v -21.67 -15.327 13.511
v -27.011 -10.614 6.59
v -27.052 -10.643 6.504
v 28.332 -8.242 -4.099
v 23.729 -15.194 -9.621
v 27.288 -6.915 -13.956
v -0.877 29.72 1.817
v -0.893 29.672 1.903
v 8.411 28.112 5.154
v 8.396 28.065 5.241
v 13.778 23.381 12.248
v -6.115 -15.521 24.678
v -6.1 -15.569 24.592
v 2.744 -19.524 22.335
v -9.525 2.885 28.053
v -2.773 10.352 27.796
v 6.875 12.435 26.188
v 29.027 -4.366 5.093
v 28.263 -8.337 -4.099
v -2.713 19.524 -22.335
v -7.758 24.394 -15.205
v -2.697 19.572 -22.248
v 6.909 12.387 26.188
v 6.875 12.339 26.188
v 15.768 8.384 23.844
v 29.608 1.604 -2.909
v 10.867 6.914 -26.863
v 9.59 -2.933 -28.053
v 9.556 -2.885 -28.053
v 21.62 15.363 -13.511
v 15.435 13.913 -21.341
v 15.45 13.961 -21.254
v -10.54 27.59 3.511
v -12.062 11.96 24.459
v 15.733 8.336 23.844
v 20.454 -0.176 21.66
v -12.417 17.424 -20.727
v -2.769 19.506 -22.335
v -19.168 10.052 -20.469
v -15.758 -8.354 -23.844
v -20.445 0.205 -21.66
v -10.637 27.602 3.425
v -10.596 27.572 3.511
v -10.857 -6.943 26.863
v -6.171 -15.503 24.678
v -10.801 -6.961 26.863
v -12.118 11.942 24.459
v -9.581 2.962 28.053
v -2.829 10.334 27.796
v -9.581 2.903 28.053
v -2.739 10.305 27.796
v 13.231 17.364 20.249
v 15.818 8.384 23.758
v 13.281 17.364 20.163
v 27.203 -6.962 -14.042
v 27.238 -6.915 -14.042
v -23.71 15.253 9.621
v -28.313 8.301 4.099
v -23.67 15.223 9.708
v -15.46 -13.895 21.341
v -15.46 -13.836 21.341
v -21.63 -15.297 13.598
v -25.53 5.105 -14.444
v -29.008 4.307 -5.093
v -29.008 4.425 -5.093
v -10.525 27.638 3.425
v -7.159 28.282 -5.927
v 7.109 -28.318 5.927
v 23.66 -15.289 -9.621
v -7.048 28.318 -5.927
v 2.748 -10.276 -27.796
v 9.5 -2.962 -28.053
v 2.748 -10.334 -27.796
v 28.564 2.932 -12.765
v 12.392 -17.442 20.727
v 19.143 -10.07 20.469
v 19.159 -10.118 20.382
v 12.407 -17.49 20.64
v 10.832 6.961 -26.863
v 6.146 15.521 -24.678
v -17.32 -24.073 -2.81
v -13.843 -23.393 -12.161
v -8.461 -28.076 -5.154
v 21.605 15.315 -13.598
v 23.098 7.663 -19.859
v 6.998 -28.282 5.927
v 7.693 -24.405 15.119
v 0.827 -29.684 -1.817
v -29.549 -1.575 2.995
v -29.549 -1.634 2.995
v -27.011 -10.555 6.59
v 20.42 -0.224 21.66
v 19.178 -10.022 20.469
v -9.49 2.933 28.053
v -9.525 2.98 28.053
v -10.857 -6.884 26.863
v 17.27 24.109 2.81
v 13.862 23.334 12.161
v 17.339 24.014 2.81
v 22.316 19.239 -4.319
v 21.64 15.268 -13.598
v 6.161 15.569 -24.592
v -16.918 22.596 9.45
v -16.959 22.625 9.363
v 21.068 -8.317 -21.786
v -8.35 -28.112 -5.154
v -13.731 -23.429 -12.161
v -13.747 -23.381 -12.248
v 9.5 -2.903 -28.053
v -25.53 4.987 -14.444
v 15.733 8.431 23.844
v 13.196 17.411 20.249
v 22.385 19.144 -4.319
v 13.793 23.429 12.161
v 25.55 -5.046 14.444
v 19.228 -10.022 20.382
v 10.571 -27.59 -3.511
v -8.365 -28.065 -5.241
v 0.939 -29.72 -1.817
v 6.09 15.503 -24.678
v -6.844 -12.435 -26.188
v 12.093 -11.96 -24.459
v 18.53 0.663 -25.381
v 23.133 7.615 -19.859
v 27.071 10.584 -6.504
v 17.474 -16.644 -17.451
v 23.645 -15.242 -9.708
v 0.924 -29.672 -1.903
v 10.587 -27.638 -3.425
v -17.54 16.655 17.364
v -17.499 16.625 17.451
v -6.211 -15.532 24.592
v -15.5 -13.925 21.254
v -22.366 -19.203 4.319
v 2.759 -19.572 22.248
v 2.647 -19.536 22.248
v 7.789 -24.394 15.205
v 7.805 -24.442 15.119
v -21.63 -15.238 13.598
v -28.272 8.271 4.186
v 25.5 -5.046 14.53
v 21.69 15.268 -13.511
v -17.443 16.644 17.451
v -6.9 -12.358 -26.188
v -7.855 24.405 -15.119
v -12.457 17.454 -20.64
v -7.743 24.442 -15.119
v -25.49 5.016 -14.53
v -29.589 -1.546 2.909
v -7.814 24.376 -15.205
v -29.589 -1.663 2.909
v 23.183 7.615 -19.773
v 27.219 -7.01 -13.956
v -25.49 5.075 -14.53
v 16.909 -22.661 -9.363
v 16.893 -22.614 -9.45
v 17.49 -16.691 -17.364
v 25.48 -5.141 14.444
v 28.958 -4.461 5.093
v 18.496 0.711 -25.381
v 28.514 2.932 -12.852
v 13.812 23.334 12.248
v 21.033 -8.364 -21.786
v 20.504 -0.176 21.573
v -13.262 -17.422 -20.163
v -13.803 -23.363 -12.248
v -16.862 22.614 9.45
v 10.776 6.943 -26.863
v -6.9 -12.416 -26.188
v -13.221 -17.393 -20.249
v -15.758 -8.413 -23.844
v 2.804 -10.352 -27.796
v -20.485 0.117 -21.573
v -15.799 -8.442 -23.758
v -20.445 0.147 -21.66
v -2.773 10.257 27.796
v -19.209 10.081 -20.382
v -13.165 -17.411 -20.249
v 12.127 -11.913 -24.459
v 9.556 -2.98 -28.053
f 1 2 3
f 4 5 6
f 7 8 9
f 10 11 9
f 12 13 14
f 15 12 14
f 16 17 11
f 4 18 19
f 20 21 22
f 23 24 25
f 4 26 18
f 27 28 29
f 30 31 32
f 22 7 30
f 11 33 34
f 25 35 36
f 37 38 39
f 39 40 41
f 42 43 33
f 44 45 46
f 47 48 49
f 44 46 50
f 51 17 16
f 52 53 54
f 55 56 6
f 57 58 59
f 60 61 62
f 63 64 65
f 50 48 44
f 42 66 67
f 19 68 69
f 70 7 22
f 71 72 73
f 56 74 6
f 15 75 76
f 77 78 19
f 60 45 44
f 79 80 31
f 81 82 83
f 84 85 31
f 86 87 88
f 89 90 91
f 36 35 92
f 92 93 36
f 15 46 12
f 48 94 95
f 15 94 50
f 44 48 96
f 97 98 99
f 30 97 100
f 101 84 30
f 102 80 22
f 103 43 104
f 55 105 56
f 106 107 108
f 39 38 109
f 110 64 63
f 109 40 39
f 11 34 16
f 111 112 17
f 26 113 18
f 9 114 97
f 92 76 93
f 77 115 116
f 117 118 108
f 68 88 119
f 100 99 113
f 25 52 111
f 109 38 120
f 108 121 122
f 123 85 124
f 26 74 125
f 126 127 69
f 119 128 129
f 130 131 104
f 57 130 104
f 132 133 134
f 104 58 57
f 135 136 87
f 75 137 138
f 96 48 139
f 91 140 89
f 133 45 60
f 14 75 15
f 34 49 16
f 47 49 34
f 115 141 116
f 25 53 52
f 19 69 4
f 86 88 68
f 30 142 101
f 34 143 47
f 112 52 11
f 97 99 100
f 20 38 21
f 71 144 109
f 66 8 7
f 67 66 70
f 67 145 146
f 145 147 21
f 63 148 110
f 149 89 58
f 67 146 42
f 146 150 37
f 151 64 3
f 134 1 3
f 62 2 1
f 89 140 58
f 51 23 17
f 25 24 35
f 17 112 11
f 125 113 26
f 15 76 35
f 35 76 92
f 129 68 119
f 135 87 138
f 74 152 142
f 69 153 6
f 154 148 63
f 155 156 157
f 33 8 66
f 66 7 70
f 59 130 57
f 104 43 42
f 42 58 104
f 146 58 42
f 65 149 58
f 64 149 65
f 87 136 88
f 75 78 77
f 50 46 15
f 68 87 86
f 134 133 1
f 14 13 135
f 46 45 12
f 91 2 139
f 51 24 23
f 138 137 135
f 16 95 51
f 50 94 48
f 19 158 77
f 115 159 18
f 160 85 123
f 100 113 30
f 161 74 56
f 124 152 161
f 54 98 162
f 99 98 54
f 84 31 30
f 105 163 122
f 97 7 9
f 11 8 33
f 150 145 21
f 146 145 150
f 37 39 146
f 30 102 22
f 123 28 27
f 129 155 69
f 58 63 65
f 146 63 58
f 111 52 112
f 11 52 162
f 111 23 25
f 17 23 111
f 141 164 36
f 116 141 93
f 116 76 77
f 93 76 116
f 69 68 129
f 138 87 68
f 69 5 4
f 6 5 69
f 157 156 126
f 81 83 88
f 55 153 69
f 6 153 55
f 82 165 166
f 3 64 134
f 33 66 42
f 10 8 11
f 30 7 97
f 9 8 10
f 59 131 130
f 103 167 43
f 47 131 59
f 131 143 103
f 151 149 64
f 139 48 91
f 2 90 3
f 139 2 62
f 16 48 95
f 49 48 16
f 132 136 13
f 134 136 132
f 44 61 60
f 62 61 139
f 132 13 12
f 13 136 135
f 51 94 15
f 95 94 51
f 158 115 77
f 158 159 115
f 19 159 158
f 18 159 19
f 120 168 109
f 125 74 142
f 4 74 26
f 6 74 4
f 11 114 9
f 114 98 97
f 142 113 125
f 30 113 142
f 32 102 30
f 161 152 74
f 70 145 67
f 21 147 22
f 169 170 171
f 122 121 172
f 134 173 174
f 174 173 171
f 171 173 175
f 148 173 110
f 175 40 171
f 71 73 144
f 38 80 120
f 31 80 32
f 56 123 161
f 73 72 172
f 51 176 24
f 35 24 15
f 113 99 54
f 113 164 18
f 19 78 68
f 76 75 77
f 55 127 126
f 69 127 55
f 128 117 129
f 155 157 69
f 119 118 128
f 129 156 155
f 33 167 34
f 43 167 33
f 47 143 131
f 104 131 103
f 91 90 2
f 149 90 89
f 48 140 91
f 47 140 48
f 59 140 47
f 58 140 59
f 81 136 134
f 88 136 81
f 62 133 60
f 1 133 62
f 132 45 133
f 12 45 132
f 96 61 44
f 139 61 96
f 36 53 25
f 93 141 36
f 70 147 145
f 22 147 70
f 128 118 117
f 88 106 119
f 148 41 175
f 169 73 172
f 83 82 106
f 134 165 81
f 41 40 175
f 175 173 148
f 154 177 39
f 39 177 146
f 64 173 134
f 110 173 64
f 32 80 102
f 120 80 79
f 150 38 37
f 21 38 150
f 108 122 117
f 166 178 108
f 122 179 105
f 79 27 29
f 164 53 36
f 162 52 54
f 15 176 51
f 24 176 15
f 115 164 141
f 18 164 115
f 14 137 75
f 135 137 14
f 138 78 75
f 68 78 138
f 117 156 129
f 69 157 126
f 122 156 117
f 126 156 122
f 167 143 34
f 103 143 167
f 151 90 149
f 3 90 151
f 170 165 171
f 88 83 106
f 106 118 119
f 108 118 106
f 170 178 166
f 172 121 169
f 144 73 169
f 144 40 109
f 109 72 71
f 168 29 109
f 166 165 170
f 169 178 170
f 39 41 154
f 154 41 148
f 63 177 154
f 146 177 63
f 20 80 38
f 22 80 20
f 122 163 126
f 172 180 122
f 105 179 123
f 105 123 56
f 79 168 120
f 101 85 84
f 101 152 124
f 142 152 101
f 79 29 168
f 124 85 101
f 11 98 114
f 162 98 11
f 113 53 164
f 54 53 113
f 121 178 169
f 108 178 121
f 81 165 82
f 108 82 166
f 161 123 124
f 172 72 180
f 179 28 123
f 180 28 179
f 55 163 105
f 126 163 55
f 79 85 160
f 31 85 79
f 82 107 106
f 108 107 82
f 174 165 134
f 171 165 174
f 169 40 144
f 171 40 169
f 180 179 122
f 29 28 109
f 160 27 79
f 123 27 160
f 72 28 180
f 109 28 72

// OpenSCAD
// Auto-generated OpenSCAD file

    inner_points = 10*[[0.2788714861850696, -1.0304896461318445, -2.7709112654901276], [0.685907632903912, 1.238698593681754, 2.610131025628235], [-0.685907632903912, -1.238698593681754, -2.610131025628235], [-0.2788714861850696, 1.0304896461318445, 2.7709112654901276], [-0.7773759281468879, 2.434668491612277, -1.51185431179736], [-0.7078458534974362, 2.8222921190953687, -0.5926625515339796], [0.7078458534974362, -2.8222921190953687, 0.5926625515339796], [0.7773759281468879, -2.434668491612277, 1.51185431179736], [2.697104584625795, 1.0584362440316053, -0.6503591582524926], [-2.9508107534296504, -0.16044016521109683, 0.2908647600571094], [2.9508107534296504, 0.16044016521109683, -0.2908647600571094], [-2.697104584625795, -1.0584362440316053, 0.6503591582524926], [0.9540270796310585, -0.2932647414592524, -2.7966865359849638], [1.3180912769762223, 1.736358921727268, 2.016264005111785], [-1.5717974457800779, -0.8383628429067593, -2.375758403307168], [-1.2077332484349137, 1.1912608202797608, 2.4371921377895807], [1.2077332484349137, -1.1912608202797608, -2.4371921377895807], [1.5717974457800779, 0.8383628429067593, 2.375758403307168], [-1.3180912769762223, -1.736358921727268, -2.016264005111785], [-0.9540270796310585, 0.2932647414592524, 2.7966865359849638], [-0.27283786287581185, 1.9476828140945452, -2.2247963084458355], [-0.09080576420322983, 2.962494645687806, 0.18167896210253875], [-1.2376169819647935, 1.7394738665446359, -2.0640160685839426], [-1.0555848832922115, 2.754285698137896, 0.34245920196443147], [1.0555848832922115, -2.754285698137896, -0.34245920196443147], [1.2376169819647935, -1.7394738665446359, 2.0640160685839426], [0.09080576420322983, -2.962494645687806, -0.18167896210253875], [0.27283786287581185, -1.9476828140945452, 2.2247963084458355], [2.1589538015444045, 1.5267784157640718, -1.351108289429837], [2.2284838761938564, 1.9144020432471627, -0.4319165291664567], [-2.892695249277868, 0.4365822128690581, -0.5092520240742452], [-2.823165174628416, 0.8242058403521488, 0.40993973618913493], [2.823165174628416, -0.8242058403521488, -0.40993973618913493], [2.892695249277868, -0.4365822128690581, 0.5092520240742452], [-2.2284838761938564, -1.9144020432471627, 0.4319165291664567], [-2.1589538015444045, -1.5267784157640718, 1.351108289429837], [1.0816726584322927, 0.6913812641039931, -2.677611559852939], [1.3762067811280048, 2.3333812998074226, 1.2161472209804305], [-2.0404181542120163, 0.017602956308798157, -2.157315774221132], [-1.7458840315163044, 1.6596029920122275, 1.7364430066122367], [1.7458840315163044, -1.6596029920122275, -1.7364430066122367], [2.0404181542120163, -0.017602956308798157, 2.157315774221132], [-1.3762067811280048, -2.3333812998074226, -1.2161472209804305], [-1.0816726584322927, -0.6913812641039931, 2.677611559852939], [0.6130519500003537, 1.5473470633195512, -2.4591689307669027], [0.8380559980466143, 2.8017234715398893, 0.5153980898030859], [-1.9127725754107823, 1.002248961872044, -2.038240798089107], [-1.6877685273645218, 2.256625370092382, 0.9363262224808817], [1.6877685273645218, -2.256625370092382, -0.9363262224808817], [1.9127725754107823, -1.002248961872044, 2.038240798089107], [-0.8380559980466143, -2.8017234715398893, -0.5153980898030859], [-0.6130519500003537, -1.5473470633195512, 2.4591689307669027], [1.5419137122501982, 1.3865758891716347, -2.1254498030663553], [1.72394581092278, 2.4013877207648946, 0.28102546748201884], [-2.544956219483093, 0.50458863382653, -1.4443737775726566], [-2.362924120810511, 1.5194004654197903, 0.9621014929757177], [2.362924120810511, -1.5194004654197903, -0.9621014929757177], [2.544956219483093, -0.50458863382653, 1.4443737775726566], [-1.72394581092278, -2.4013877207648946, -0.28102546748201884], [-1.5419137122501982, -1.3865758891716347, 2.1254498030663553], [2.3082876055504564, 0.7615081838539526, -1.9772559454450247], [2.7187928098306124, -0.69147999344176, -1.3955817903997059], [1.8480465517325515, 0.06631355878631129, -2.5294177022316076], [2.101752720536407, -0.8316825200341973, -2.1699233040362245], [2.8464383886318467, 0.29316601212148596, -1.2765068142676803]];

    outer_points = 10*[[0.06653641711366541, -2.9685347860851214, 0.03164785636256174], [0.8271195003044141, 2.824663490765131, 0.3934170229754035], [-0.8271195003044141, -2.824663490765131, -0.3934170229754035], [-0.06653641711366541, 2.9685347860851214, -0.03164785636256174], [1.192305111883895, -0.49479820391320845, -2.6741747727835405], [1.3222282132537881, 0.49479820391320845, -2.612377221477033], [-1.3222282132537881, -0.49479820391320845, 2.612377221477033], [-1.192305111883895, 0.49479820391320845, 2.6741747727835405], [2.8305432173739673, -0.4211186164098232, 0.792661127660119], [-2.4010096459338772, 0.4211186164098232, -1.6957120182559484], [2.4010096459338772, -0.4211186164098232, 1.6957120182559484], [-2.8305432173739673, 0.4211186164098232, -0.792661127660119], [1.0444344734338675, -2.7791270014109664, -0.056896384274534084], [1.724720664054224, 2.4024670602577576, 0.26667979520937046], [-1.2951870926141336, -2.4024670602577576, -1.1697306858052], [-0.614900901993777, 2.7791270014109664, -0.8461545063212954], [0.614900901993777, -2.7791270014109664, 0.8461545063212954], [1.2951870926141336, 2.4024670602577576, 1.1697306858052], [-1.724720664054224, -2.4024670602577576, -0.26667979520937046], [-1.0444344734338675, 2.7791270014109664, 0.056896384274534084], [1.4012899003932389, -1.3673341630771763, -2.232579530352738], [1.7414329957034171, 1.2234628677571857, -2.070791440610786], [0.5076339829751594, -1.2234628677571857, -2.657644409690703], [0.8477770782853377, 1.3673341630771763, -2.495856319948751], [-0.8477770782853377, -1.3673341630771763, 2.495856319948751], [-0.5076339829751594, 1.2234628677571857, 2.657644409690703], [-1.7414329957034171, -1.2234628677571857, 2.070791440610786], [-1.4012899003932389, 1.3673341630771763, 2.232579530352738], [2.836926760032699, -0.8714581450664176, -0.10017343669796008], [2.9668498614025918, 0.11813826275999922, -0.03837588539145265], [-1.8423163720633038, -0.11813826275999922, -2.3258420397592916], [-1.7123932706934106, 0.8714581450664176, -2.264044488452784], [1.7123932706934106, -0.8714581450664176, 2.264044488452784], [1.8423163720633038, 0.11813826275999922, 2.3258420397592916], [-2.9668498614025918, -0.11813826275999922, 0.03837588539145265], [-2.836926760032699, 0.8714581450664176, 0.10017343669796008], [1.733050848674334, -2.3287874727543723, -0.6252288544713702], [2.2834139379247977, 1.863210181087935, -0.36345022629397317], [-1.1588804485855093, -1.863210181087935, -2.0007676988567713], [-0.6085173593350457, 2.3287874727543723, -1.7389890706793742], [0.6085173593350457, -2.3287874727543723, 1.7389890706793742], [1.1588804485855093, 1.863210181087935, 2.0007676988567713], [-2.2834139379247977, -1.863210181087935, 0.36345022629397317], [-1.733050848674334, 2.3287874727543723, 0.6252288544713702], [1.8693574927029581, -1.7895305935845496, -1.4562658675229414], [2.2897974805835286, 1.4128706524313404, -1.2562847906520518], [-0.47026407334504305, -1.4128706524313404, -2.5691001690536073], [-0.04982408546447248, 1.7895305935845496, -2.369119092182718], [0.04982408546447248, -1.7895305935845496, 2.369119092182718], [0.47026407334504305, 1.4128706524313404, 2.5691001690536073], [-2.2897974805835286, -1.4128706524313404, 1.2562847906520518], [-1.8693574927029581, 1.7895305935845496, 1.4562658675229414], [2.41772197758307, -1.600122808910395, -0.6417592175642077], [2.757865072893248, 0.990674221923967, -0.4799711278222555], [-1.3678652370948527, -0.990674221923967, -2.4423629412875743], [-1.027722141784675, 1.600122808910395, -2.280574851545622], [1.027722141784675, -1.600122808910395, 2.280574851545622], [1.3678652370948527, 0.990674221923967, 2.4423629412875743], [-2.757865072893248, -0.990674221923967, 0.4799711278222555], [-2.41772197758307, 1.600122808910395, 0.6417592175642077], [2.586519131581444, -1.7365837684676733, 0.3343995437644788], [1.8915192136822463, -1.7365837684676733, 1.7955665783193937], [1.9018480026727085, -2.4652484323116504, 0.3509299068573166], [1.472314431232618, -2.4652484323116504, 1.253980797453146], [2.5801355889227136, -1.2862442398110787, 1.227234108122558]];

    // Convex hull for inner set (I)
    module inner_hull() {
        hull() {
            for (p = inner_points) {
                translate(p) sphere(r=0.1);
            }
        }
    }

    // Convex hull for outer set (O) minus inner hull (O \ I)
    module outer_minus_inner() {
        difference() {
            hull() {
                for (p = outer_points) {
                    translate(p) sphere(r=0.1);
                }
            }
            inner_hull(); // Subtract inner hull
        }
    }

    // Convex hull for outer set (O) minus all translated inner hulls
    module outer_minus_AllTranslationInner() {
        difference() {
            hull() {
                for (p = outer_points) {
                    translate(p) sphere(r=0.1);
                }
            }
            hull() {
                translate([0,0,50]) inner_hull();
                translate([0,0,-50]) inner_hull();
            }; // Subtract translated inner hulls
        }
    }

    // Difference between outer_minus_inner and outer_minus_AllTranslationInner
    module outer_minus_inner_diff() {
        difference() {
            // Outer minus inner
            difference() {
                hull() {
                    for (p = outer_points) {
                        translate(p) sphere(r=0.1);
                    }
                }
                inner_hull();
            }

            // Subtract Outer minus AllTranslationInner
            difference() {
                hull() {
                    for (p = outer_points) {
                        translate(p) sphere(r=0.1);
                    }
                }
                hull() {
                    translate([0,0,50]) inner_hull();
                    translate([0,0,-50]) inner_hull();
                };
            }
        }
    }

    // Rendering all with colors applied
    color([1, 0, 0, 0.5]) inner_hull(); // Transparent red
    
